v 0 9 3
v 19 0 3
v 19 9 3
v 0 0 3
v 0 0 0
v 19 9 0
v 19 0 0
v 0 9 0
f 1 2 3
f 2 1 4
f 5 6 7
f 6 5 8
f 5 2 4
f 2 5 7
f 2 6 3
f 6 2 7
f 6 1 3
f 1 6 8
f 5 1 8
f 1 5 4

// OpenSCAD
// Generated by SolidPython 1.0.1 on 2020-07-29 00:46:56


cube(size = [19, 9, 3]);
/***********************************************
*********      SolidPython code:      **********
************************************************
 
# import packages: SolidPython
from solid import *
from solid.utils import *
from itertools import chain, combinations, permutations


class Resize:

    def __init__(self, scad_file):
        self.scad_file = scad_file
        #self.scad_file = import_scad(scad_file)
        # cone/cylinder param:
        self.r1 = 0
        self.r2 = 0
        self.h = 0
        # rectangular prism param:
        self.w = 0
        self.l = 0
        # ellipse param:
        self.r = 0

    # import OpenScad code (file name corresponds to shape)


    # classify shape + parameters
    def assign(self, param1, param2, param3):
        if self.scad_file == 'cone.scad':
            self.r1 = param1
            self.r2 = param2
            self.h = param3
        elif self.scad_file == 'cylinder.scad':
            self.r1 = param1
            self.r2 = param2
            self.h = param3
        elif self.scad_file == 'rectangularPrism.scad':
            self.h = param1
            self.l = param2
            self.w = param3
        else:
            self.r = param1
            self.h = param2

    # resize parameters
    def iterate(self):
        x = range(3, 20, 2)
        i = 1
        if self.scad_file == 'cone.scad':
            tempList = list(permutations(x, 2))
            for temp in tempList:
                param1 = temp[0]
                param2 = temp[1]
                filepath = 'produced_scad_files/' + 'cone' + str(param1) + '_' + str(param2) + '_' + '.scad'
                scad_render_to_file(cylinder(h=param1, r1=param2, r2=0), filepath)

        elif self.scad_file == 'cylinder.scad':
            tempList = list(permutations(x, 3))
            for temp in tempList:
                param1 = temp[0]
                param2 = temp[1]
                filepath = 'produced_scad_files/' + 'cylinder' + str(param1) + '_' + str(param2) + '_' + '.scad'
                scad_render_to_file(cylinder(h=param1, r1=param2, r2=param2), filepath)

        elif self.scad_file == 'rectangularPrism.scad':
            tempList = list(permutations(x, 3))
            for temp in tempList:
                param1 = temp[0]
                param2 = temp[1]
                param3 = temp[2]
                filepath = 'produced_scad_files/' + 'rectangularPrism' + str(param1) + '_' + str(param2) + '_' + str(
                    param3) + '.scad'
                scad_render_to_file(cube(size=(param1, param2, param3)), filepath)

        elif self.scad_file == 'ellipse.scad':
            tempList = list(permutations(x, 4))
            for temp in tempList:
                param1 = temp[0]
                param2 = temp[1]
                param3 = temp[2]
                param4 = temp[3]
                filepath = 'produced_scad_files/' + 'ellipse' + str(param1) + '_' + str(param2) + '_' + str(param3) + '_' + str(param4) + '.scad'
                scad_render_to_file(scale([param1, param2, param3])(sphere(r=param4)), filepath)

    def render_to_scadfile(self):
        scad_render_to_file(scad, 'example.scad') 
 
************************************************/
